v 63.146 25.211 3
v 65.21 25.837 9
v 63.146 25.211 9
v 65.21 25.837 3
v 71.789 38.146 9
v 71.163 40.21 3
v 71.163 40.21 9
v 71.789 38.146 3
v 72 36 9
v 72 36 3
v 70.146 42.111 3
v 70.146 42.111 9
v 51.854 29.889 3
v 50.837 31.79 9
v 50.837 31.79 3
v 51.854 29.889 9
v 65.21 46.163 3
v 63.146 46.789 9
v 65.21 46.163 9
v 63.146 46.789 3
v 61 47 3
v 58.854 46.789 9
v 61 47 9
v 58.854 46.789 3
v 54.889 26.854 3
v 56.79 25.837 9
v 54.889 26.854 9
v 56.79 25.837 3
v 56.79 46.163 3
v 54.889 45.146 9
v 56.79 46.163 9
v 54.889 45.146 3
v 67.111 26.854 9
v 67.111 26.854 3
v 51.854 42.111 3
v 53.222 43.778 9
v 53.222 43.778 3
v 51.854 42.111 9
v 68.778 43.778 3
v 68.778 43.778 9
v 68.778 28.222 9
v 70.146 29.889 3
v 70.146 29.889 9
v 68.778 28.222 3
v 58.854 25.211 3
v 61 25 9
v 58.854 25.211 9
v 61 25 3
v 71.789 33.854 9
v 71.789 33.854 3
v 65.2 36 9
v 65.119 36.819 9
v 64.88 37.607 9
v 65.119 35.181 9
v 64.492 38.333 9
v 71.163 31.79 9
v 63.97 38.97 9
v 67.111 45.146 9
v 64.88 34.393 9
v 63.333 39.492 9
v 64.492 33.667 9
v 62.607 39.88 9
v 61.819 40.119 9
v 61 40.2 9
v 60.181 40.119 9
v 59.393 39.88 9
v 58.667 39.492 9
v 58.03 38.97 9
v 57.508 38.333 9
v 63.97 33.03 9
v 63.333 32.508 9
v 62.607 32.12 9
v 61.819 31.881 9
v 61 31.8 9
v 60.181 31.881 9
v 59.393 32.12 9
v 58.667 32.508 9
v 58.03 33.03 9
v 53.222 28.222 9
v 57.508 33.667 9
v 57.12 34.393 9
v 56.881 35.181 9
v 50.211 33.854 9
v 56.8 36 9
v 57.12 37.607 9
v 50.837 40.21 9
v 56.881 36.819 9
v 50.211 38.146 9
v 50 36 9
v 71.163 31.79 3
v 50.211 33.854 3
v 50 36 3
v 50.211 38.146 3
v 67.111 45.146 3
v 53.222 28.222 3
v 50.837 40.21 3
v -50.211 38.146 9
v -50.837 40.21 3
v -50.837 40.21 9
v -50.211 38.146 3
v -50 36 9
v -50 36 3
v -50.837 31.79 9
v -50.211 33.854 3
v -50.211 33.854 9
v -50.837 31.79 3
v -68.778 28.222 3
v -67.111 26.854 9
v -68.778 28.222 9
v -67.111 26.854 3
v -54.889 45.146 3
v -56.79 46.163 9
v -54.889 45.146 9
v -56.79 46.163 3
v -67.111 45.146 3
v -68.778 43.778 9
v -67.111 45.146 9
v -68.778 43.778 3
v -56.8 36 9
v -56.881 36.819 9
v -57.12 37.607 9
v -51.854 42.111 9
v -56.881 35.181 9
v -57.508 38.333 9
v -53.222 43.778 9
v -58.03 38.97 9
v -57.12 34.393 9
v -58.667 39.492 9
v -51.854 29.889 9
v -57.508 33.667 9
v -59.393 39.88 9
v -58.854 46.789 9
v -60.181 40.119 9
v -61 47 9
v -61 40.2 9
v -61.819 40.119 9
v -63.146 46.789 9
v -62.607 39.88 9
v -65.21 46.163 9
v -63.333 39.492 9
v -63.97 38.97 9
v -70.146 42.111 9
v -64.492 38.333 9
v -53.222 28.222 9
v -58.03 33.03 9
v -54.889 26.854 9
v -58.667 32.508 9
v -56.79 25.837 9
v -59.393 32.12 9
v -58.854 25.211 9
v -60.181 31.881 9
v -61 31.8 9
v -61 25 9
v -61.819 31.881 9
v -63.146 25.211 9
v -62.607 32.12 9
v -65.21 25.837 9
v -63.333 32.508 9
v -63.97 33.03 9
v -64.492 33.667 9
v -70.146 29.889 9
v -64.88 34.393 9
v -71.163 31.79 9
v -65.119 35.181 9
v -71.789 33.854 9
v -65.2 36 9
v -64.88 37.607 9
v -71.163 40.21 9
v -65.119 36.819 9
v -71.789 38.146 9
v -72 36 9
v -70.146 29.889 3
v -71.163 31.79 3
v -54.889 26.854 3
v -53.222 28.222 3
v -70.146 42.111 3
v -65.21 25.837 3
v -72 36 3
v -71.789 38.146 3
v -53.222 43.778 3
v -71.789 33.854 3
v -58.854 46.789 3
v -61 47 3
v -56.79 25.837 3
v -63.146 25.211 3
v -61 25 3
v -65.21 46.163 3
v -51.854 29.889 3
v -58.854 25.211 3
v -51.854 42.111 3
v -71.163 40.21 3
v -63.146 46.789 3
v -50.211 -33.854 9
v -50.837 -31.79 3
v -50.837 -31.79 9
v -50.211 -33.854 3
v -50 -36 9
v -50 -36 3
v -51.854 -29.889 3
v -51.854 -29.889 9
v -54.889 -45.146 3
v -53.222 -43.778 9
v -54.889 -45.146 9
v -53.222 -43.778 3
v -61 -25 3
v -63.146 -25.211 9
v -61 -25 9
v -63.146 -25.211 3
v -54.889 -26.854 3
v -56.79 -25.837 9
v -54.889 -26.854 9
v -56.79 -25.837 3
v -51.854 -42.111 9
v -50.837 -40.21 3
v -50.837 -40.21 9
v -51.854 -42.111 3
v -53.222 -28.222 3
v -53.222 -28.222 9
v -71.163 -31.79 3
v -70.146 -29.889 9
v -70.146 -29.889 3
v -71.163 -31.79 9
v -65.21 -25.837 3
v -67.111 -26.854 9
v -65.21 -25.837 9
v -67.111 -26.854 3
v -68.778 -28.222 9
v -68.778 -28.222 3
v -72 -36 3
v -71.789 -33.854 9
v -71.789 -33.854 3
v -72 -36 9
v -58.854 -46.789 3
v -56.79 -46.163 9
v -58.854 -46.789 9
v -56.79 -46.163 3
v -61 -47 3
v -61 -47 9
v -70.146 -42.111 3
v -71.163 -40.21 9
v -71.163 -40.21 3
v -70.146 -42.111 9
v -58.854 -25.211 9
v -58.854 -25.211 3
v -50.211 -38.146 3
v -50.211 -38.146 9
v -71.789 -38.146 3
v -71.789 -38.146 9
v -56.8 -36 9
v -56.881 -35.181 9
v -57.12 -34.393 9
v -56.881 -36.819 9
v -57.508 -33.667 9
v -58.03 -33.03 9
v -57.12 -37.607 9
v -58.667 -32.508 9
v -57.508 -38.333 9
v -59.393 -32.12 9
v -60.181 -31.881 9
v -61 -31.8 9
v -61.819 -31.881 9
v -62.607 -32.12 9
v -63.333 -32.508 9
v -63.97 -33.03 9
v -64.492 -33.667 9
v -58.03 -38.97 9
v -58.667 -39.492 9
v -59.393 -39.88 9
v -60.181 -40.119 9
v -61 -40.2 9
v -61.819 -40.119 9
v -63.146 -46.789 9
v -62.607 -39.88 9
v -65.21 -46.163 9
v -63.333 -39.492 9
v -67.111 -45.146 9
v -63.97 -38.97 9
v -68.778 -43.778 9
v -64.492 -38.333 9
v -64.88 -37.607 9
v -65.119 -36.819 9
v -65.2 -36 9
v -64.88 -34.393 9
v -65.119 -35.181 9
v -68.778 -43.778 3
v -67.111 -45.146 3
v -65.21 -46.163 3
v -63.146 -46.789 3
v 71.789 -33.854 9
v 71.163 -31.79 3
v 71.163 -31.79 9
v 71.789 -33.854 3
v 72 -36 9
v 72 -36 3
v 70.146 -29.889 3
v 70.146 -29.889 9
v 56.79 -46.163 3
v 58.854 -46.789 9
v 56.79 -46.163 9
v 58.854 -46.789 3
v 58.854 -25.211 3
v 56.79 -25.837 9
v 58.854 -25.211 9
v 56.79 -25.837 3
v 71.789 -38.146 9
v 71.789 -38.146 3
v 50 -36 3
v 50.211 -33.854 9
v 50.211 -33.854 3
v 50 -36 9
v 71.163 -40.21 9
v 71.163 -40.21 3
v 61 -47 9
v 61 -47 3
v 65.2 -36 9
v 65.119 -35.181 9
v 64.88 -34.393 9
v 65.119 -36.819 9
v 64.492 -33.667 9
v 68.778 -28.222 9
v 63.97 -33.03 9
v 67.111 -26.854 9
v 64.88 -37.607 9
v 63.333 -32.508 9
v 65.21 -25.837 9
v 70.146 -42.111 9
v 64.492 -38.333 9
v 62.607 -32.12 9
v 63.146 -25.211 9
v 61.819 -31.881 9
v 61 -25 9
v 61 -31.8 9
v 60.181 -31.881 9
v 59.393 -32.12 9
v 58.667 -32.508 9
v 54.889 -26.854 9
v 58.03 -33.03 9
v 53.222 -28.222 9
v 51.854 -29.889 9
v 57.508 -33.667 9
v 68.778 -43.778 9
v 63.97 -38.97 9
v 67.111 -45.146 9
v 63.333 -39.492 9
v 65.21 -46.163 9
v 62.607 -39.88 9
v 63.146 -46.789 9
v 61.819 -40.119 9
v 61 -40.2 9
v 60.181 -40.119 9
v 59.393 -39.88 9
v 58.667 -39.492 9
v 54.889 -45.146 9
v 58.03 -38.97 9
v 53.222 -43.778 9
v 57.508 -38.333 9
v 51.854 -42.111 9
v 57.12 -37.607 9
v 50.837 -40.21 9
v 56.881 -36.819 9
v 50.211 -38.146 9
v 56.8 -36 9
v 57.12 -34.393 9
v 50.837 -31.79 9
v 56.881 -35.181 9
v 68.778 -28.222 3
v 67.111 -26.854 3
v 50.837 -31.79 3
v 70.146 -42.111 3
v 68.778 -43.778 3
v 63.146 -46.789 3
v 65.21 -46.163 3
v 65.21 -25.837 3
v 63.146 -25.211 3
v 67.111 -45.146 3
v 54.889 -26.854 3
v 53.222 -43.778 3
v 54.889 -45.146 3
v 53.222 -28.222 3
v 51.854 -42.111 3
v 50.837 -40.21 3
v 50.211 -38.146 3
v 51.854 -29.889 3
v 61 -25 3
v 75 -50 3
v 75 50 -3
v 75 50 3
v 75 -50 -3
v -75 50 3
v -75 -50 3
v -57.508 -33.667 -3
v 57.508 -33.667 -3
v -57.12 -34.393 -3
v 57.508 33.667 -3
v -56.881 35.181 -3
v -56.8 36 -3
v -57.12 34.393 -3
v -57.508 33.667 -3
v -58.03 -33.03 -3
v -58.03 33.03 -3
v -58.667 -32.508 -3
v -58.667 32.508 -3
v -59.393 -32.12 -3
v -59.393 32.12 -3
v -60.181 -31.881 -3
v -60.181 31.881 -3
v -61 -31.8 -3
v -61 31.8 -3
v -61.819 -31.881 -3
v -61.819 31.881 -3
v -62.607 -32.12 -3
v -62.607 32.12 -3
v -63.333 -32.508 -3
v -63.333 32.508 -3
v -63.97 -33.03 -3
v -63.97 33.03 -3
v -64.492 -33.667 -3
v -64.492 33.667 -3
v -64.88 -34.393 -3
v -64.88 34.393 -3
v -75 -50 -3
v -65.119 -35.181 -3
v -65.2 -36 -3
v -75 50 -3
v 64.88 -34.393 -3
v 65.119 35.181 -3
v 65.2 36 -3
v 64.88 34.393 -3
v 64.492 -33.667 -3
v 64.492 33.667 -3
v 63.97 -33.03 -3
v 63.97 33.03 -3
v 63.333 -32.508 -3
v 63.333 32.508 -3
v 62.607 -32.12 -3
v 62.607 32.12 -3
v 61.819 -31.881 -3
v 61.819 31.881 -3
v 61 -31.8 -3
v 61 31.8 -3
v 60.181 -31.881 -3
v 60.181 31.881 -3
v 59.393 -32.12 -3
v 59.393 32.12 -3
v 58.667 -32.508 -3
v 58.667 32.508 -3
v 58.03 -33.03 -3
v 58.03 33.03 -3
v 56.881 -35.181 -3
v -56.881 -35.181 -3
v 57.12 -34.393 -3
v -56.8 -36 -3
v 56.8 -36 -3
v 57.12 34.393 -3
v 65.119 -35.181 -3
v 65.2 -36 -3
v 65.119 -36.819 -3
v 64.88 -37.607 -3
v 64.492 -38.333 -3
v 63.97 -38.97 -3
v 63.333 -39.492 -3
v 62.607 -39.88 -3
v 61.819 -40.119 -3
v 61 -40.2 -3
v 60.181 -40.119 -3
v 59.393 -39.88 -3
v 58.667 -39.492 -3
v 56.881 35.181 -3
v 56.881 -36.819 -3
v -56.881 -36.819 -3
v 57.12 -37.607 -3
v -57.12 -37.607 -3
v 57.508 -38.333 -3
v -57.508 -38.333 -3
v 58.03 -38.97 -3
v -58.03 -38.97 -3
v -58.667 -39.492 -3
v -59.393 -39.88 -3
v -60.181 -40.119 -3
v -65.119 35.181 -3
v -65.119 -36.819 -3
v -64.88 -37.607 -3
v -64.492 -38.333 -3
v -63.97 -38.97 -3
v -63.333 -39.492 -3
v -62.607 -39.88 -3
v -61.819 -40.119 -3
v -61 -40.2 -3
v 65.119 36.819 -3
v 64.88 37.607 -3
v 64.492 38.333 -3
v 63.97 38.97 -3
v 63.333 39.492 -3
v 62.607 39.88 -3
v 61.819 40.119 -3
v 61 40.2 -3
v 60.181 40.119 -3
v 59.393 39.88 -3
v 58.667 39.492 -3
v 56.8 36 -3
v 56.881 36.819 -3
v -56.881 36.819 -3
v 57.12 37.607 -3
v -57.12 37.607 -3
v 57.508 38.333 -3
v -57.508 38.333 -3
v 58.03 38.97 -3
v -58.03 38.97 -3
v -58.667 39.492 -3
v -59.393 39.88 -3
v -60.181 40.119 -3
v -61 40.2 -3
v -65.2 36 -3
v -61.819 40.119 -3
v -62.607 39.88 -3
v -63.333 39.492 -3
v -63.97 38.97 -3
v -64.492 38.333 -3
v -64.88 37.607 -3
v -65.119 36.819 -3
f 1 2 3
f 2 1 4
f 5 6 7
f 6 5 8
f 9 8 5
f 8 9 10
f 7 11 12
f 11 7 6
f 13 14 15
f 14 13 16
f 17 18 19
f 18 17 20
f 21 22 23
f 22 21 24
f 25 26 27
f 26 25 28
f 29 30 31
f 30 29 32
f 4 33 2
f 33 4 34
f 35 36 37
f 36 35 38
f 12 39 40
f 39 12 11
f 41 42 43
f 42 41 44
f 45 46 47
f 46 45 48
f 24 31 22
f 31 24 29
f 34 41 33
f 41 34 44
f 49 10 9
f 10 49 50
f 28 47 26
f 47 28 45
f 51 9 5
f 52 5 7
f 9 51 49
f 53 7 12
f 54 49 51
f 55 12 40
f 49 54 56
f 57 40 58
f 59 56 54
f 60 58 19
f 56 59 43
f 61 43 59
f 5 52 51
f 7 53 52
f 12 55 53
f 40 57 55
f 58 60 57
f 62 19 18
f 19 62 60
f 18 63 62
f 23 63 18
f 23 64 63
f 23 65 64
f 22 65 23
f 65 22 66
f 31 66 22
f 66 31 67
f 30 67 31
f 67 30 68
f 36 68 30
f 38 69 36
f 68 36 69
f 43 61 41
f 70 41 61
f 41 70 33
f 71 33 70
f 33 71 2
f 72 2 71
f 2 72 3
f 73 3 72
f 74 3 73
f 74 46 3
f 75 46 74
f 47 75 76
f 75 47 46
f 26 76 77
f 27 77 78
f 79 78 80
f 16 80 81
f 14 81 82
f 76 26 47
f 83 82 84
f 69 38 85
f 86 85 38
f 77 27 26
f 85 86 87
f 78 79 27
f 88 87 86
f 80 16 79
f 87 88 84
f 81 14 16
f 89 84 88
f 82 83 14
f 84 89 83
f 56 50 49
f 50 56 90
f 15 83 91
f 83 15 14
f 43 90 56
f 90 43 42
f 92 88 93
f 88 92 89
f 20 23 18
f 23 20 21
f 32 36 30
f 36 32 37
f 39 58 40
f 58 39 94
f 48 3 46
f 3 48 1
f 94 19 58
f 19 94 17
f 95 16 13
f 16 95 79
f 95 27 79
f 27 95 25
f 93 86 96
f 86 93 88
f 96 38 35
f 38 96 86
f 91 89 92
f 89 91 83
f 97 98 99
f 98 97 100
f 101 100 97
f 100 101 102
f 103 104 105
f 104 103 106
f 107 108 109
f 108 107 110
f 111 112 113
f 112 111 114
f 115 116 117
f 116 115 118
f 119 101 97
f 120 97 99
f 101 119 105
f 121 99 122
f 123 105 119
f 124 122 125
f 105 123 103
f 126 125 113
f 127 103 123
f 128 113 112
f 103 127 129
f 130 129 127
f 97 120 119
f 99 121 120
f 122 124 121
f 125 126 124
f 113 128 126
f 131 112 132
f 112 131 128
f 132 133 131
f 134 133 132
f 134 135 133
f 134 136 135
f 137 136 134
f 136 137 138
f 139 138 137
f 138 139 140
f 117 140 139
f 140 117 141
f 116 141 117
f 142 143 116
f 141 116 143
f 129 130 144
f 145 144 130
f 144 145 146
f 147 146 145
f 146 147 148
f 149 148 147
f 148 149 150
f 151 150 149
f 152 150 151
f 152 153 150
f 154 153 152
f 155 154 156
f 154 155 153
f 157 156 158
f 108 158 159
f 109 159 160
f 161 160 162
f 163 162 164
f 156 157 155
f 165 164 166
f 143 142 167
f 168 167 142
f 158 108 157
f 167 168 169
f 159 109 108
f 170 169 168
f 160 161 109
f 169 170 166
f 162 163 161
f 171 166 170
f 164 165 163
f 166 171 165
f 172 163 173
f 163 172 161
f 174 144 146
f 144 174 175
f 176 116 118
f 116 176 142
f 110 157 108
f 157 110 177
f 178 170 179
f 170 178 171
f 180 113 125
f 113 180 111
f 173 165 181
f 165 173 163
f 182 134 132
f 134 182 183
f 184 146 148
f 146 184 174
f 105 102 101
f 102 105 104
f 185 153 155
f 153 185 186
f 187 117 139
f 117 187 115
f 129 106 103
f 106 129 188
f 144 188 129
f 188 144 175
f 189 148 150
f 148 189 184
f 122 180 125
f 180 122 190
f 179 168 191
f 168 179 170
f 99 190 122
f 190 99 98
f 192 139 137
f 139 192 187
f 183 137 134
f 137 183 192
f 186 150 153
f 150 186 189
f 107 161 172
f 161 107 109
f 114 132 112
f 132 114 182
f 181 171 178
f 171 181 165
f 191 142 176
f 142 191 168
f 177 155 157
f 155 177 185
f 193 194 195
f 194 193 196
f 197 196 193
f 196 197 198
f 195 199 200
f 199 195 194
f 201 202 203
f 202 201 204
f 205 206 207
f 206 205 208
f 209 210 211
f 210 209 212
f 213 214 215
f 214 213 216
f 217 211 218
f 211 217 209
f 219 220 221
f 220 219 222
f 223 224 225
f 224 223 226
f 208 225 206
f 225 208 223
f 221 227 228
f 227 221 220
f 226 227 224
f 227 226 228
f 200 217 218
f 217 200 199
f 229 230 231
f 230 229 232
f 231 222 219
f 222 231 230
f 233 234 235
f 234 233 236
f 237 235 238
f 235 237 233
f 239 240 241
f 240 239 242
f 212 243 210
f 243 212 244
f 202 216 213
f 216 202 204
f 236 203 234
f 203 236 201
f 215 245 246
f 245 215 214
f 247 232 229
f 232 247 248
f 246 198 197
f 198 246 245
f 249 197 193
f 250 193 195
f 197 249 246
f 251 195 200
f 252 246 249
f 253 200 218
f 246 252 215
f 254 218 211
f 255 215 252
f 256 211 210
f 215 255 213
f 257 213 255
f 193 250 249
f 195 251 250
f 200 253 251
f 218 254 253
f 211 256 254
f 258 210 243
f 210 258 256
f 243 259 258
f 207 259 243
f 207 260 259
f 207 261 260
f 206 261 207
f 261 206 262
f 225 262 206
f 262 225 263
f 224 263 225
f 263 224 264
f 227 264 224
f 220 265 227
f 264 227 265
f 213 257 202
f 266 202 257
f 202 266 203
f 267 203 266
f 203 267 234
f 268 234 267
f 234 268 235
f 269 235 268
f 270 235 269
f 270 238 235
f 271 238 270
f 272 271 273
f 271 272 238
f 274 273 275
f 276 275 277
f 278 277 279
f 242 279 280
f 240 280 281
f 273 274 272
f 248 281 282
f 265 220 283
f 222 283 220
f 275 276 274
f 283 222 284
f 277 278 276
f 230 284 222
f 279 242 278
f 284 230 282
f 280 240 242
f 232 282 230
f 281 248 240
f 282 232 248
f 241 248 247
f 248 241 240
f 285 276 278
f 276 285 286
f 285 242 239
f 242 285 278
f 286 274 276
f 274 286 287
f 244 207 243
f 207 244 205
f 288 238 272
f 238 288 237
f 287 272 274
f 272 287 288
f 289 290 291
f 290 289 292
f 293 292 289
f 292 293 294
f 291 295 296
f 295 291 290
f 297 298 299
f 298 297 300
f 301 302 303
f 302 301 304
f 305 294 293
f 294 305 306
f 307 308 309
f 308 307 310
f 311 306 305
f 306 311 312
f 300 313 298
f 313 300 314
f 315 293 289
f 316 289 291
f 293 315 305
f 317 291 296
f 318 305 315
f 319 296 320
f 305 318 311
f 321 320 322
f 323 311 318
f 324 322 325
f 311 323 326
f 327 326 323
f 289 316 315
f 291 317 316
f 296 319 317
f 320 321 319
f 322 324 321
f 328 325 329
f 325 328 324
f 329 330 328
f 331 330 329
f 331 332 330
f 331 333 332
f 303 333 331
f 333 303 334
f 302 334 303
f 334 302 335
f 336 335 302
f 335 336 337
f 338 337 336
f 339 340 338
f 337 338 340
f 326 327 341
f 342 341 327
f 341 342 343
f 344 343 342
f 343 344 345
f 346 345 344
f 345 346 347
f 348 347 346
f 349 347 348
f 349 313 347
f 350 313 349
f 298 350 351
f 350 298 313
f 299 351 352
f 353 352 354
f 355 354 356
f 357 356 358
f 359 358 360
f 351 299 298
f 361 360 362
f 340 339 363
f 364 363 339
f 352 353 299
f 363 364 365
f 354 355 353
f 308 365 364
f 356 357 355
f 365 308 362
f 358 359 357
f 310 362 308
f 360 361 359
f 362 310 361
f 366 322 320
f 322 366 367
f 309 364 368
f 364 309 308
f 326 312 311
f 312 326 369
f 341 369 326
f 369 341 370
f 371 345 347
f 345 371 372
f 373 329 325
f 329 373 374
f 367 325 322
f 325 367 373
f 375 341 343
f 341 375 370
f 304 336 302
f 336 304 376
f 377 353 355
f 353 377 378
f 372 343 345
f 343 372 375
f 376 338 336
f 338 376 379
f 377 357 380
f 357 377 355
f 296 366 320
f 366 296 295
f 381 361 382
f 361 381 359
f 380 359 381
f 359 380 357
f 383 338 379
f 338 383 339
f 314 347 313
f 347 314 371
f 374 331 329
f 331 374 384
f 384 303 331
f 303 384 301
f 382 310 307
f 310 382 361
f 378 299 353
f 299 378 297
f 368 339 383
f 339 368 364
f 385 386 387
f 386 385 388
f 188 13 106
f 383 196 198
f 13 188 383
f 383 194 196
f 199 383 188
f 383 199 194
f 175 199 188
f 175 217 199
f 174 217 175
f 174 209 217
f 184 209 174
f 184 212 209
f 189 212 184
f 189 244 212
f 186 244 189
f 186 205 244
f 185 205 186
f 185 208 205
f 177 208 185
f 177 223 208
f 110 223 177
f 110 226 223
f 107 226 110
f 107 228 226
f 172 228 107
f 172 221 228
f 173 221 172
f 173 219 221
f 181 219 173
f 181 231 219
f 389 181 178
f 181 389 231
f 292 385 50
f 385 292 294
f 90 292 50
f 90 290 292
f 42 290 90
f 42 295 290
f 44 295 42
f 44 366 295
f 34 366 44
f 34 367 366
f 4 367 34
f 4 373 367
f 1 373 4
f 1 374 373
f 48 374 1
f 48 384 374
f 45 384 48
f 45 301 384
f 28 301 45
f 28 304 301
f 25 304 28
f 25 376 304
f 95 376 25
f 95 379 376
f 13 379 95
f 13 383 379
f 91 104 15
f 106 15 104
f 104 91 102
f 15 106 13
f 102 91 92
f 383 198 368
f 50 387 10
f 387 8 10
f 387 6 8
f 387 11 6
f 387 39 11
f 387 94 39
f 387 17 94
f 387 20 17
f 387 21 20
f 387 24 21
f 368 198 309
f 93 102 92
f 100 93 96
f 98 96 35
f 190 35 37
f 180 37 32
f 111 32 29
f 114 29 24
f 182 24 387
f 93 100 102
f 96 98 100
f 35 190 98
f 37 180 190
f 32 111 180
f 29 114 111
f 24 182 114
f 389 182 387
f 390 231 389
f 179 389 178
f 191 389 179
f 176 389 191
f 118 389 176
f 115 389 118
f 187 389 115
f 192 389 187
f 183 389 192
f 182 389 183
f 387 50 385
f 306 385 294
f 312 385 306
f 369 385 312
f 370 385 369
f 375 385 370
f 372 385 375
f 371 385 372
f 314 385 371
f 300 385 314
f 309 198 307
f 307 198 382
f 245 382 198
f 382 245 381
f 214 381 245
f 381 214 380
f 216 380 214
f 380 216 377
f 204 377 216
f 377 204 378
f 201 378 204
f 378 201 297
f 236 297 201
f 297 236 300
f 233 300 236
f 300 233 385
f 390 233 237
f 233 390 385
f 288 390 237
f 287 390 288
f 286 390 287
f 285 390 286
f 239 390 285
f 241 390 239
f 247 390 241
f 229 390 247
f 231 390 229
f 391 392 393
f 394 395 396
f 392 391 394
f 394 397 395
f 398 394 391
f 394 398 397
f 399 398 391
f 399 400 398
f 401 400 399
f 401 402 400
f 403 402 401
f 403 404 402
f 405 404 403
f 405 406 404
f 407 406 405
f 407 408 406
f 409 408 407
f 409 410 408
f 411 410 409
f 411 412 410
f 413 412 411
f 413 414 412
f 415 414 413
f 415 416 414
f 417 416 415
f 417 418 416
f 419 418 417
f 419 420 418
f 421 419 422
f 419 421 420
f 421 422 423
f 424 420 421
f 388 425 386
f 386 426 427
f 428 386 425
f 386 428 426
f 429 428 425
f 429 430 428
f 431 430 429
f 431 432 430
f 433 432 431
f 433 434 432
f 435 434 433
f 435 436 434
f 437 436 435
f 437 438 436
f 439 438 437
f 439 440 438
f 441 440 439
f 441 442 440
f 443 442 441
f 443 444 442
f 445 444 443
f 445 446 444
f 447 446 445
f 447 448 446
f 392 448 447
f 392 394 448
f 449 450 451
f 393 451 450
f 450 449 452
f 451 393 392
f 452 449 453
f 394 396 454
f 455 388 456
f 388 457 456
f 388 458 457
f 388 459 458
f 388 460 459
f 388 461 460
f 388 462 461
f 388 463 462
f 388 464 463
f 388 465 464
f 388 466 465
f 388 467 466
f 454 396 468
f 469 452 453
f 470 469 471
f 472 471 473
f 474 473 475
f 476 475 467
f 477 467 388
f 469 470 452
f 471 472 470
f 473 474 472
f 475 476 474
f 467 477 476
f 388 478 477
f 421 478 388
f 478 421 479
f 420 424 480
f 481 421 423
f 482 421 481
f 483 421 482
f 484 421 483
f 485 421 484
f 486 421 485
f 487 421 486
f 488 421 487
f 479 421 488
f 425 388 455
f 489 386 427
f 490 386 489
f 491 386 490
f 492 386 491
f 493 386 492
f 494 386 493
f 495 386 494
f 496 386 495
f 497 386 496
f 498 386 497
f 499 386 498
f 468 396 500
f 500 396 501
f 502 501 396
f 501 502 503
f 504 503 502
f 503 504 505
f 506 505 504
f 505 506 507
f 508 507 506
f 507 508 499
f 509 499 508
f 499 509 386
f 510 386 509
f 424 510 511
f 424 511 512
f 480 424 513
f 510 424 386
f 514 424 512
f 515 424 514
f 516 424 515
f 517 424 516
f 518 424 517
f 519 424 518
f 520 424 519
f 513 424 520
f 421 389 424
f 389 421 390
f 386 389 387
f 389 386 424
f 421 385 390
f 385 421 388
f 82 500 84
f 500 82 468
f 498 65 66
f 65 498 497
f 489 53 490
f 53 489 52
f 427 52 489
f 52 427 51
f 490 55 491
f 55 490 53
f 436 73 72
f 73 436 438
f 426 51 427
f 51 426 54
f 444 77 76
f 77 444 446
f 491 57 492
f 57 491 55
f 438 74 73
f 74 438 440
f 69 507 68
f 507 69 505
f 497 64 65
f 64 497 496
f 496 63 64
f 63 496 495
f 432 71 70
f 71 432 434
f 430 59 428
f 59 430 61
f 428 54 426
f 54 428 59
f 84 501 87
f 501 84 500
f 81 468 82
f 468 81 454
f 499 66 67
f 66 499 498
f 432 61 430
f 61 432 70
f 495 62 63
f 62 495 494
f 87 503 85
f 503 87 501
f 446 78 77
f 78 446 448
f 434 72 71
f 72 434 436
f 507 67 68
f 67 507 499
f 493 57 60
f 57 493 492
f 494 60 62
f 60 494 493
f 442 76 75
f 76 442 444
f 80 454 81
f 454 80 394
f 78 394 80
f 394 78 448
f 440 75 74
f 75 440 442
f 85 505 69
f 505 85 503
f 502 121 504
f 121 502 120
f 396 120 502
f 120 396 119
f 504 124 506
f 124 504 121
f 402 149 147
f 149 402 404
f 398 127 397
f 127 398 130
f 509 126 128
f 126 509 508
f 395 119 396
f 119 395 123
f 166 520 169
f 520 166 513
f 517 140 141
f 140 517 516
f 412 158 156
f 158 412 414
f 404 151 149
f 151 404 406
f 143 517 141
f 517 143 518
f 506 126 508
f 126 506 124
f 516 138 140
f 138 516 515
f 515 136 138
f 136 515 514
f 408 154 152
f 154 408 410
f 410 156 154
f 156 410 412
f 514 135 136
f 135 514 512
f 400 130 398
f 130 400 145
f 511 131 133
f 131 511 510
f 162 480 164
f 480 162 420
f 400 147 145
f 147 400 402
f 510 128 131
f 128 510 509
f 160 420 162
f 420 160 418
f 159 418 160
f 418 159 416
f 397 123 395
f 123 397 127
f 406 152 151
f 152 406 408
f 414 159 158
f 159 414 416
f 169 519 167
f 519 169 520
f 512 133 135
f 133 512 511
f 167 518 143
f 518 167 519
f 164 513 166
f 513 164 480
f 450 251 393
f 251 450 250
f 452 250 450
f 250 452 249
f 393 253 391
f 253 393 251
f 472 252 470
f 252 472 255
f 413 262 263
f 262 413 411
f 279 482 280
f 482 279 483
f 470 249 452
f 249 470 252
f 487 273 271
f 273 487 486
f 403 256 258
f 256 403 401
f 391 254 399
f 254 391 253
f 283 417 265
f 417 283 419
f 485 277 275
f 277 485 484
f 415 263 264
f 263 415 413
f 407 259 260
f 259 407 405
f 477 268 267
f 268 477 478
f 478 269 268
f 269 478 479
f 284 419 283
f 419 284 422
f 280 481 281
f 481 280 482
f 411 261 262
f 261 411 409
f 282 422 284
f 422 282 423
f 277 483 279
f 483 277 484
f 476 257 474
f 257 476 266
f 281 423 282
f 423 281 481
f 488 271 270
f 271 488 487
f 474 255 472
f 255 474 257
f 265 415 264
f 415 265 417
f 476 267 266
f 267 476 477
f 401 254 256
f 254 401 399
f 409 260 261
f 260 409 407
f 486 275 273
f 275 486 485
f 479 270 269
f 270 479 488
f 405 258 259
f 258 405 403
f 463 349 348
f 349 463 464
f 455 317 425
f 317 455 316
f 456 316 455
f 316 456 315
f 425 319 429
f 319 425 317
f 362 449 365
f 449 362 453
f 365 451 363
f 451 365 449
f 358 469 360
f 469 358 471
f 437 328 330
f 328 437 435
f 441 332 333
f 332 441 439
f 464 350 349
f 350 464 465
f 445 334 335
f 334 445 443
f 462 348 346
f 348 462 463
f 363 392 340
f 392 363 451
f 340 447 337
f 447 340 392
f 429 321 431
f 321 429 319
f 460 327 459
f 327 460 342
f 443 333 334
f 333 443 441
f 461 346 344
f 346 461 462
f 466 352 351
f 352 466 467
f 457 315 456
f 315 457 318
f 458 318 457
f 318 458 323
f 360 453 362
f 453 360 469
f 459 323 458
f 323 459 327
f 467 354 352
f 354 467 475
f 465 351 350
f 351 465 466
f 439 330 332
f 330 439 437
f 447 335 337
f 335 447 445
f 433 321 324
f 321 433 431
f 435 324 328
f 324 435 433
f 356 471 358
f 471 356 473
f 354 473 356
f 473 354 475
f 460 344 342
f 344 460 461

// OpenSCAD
$fn = 32;

// ----------------------------------------------------------------------
// Anchor pads 150 x 100 x 12
// four corner bosses with anchor holes
// ----------------------------------------------------------------------

// --- parameters (mm) ---
plate = [150, 100, 6];  // base plate size (x, y, z)
pads = 4;               // boss count, one per corner
edge = 14;              // boss centre offset from the plate edge
boss_d = 22;            // boss diameter
boss_h = 6;             // boss height above the base plate
hole_d = 8.4;           // hole diameter

// --- derived feature positions (mm) ---
height = plate[2] + boss_h;      // = 12   overall height of the part
corner_x = plate[0] / 2 - edge;  // = 61   boss centre X
corner_y = plate[1] / 2 - edge;  // = 36   boss centre Y
feature_centers = [
  [corner_x, corner_y],
  [-corner_x, corner_y],
  [-corner_x, -corner_y],
  [corner_x, -corner_y]
];   // boss centres, anchor holes are drilled there

// base plate, four bosses standing on it, anchor holes all the way through
difference() {
  union() {
    cube(plate, center = true);
    for (centre = feature_centers)
      translate([centre[0], centre[1], plate[2] / 2 - 1])
        cylinder(d = boss_d, h = boss_h + 1);
  }
  for (centre = feature_centers)
    translate([centre[0], centre[1], -height])
      cylinder(d = hole_d, h = 2 * height + 2);  // through boss and plate
}
